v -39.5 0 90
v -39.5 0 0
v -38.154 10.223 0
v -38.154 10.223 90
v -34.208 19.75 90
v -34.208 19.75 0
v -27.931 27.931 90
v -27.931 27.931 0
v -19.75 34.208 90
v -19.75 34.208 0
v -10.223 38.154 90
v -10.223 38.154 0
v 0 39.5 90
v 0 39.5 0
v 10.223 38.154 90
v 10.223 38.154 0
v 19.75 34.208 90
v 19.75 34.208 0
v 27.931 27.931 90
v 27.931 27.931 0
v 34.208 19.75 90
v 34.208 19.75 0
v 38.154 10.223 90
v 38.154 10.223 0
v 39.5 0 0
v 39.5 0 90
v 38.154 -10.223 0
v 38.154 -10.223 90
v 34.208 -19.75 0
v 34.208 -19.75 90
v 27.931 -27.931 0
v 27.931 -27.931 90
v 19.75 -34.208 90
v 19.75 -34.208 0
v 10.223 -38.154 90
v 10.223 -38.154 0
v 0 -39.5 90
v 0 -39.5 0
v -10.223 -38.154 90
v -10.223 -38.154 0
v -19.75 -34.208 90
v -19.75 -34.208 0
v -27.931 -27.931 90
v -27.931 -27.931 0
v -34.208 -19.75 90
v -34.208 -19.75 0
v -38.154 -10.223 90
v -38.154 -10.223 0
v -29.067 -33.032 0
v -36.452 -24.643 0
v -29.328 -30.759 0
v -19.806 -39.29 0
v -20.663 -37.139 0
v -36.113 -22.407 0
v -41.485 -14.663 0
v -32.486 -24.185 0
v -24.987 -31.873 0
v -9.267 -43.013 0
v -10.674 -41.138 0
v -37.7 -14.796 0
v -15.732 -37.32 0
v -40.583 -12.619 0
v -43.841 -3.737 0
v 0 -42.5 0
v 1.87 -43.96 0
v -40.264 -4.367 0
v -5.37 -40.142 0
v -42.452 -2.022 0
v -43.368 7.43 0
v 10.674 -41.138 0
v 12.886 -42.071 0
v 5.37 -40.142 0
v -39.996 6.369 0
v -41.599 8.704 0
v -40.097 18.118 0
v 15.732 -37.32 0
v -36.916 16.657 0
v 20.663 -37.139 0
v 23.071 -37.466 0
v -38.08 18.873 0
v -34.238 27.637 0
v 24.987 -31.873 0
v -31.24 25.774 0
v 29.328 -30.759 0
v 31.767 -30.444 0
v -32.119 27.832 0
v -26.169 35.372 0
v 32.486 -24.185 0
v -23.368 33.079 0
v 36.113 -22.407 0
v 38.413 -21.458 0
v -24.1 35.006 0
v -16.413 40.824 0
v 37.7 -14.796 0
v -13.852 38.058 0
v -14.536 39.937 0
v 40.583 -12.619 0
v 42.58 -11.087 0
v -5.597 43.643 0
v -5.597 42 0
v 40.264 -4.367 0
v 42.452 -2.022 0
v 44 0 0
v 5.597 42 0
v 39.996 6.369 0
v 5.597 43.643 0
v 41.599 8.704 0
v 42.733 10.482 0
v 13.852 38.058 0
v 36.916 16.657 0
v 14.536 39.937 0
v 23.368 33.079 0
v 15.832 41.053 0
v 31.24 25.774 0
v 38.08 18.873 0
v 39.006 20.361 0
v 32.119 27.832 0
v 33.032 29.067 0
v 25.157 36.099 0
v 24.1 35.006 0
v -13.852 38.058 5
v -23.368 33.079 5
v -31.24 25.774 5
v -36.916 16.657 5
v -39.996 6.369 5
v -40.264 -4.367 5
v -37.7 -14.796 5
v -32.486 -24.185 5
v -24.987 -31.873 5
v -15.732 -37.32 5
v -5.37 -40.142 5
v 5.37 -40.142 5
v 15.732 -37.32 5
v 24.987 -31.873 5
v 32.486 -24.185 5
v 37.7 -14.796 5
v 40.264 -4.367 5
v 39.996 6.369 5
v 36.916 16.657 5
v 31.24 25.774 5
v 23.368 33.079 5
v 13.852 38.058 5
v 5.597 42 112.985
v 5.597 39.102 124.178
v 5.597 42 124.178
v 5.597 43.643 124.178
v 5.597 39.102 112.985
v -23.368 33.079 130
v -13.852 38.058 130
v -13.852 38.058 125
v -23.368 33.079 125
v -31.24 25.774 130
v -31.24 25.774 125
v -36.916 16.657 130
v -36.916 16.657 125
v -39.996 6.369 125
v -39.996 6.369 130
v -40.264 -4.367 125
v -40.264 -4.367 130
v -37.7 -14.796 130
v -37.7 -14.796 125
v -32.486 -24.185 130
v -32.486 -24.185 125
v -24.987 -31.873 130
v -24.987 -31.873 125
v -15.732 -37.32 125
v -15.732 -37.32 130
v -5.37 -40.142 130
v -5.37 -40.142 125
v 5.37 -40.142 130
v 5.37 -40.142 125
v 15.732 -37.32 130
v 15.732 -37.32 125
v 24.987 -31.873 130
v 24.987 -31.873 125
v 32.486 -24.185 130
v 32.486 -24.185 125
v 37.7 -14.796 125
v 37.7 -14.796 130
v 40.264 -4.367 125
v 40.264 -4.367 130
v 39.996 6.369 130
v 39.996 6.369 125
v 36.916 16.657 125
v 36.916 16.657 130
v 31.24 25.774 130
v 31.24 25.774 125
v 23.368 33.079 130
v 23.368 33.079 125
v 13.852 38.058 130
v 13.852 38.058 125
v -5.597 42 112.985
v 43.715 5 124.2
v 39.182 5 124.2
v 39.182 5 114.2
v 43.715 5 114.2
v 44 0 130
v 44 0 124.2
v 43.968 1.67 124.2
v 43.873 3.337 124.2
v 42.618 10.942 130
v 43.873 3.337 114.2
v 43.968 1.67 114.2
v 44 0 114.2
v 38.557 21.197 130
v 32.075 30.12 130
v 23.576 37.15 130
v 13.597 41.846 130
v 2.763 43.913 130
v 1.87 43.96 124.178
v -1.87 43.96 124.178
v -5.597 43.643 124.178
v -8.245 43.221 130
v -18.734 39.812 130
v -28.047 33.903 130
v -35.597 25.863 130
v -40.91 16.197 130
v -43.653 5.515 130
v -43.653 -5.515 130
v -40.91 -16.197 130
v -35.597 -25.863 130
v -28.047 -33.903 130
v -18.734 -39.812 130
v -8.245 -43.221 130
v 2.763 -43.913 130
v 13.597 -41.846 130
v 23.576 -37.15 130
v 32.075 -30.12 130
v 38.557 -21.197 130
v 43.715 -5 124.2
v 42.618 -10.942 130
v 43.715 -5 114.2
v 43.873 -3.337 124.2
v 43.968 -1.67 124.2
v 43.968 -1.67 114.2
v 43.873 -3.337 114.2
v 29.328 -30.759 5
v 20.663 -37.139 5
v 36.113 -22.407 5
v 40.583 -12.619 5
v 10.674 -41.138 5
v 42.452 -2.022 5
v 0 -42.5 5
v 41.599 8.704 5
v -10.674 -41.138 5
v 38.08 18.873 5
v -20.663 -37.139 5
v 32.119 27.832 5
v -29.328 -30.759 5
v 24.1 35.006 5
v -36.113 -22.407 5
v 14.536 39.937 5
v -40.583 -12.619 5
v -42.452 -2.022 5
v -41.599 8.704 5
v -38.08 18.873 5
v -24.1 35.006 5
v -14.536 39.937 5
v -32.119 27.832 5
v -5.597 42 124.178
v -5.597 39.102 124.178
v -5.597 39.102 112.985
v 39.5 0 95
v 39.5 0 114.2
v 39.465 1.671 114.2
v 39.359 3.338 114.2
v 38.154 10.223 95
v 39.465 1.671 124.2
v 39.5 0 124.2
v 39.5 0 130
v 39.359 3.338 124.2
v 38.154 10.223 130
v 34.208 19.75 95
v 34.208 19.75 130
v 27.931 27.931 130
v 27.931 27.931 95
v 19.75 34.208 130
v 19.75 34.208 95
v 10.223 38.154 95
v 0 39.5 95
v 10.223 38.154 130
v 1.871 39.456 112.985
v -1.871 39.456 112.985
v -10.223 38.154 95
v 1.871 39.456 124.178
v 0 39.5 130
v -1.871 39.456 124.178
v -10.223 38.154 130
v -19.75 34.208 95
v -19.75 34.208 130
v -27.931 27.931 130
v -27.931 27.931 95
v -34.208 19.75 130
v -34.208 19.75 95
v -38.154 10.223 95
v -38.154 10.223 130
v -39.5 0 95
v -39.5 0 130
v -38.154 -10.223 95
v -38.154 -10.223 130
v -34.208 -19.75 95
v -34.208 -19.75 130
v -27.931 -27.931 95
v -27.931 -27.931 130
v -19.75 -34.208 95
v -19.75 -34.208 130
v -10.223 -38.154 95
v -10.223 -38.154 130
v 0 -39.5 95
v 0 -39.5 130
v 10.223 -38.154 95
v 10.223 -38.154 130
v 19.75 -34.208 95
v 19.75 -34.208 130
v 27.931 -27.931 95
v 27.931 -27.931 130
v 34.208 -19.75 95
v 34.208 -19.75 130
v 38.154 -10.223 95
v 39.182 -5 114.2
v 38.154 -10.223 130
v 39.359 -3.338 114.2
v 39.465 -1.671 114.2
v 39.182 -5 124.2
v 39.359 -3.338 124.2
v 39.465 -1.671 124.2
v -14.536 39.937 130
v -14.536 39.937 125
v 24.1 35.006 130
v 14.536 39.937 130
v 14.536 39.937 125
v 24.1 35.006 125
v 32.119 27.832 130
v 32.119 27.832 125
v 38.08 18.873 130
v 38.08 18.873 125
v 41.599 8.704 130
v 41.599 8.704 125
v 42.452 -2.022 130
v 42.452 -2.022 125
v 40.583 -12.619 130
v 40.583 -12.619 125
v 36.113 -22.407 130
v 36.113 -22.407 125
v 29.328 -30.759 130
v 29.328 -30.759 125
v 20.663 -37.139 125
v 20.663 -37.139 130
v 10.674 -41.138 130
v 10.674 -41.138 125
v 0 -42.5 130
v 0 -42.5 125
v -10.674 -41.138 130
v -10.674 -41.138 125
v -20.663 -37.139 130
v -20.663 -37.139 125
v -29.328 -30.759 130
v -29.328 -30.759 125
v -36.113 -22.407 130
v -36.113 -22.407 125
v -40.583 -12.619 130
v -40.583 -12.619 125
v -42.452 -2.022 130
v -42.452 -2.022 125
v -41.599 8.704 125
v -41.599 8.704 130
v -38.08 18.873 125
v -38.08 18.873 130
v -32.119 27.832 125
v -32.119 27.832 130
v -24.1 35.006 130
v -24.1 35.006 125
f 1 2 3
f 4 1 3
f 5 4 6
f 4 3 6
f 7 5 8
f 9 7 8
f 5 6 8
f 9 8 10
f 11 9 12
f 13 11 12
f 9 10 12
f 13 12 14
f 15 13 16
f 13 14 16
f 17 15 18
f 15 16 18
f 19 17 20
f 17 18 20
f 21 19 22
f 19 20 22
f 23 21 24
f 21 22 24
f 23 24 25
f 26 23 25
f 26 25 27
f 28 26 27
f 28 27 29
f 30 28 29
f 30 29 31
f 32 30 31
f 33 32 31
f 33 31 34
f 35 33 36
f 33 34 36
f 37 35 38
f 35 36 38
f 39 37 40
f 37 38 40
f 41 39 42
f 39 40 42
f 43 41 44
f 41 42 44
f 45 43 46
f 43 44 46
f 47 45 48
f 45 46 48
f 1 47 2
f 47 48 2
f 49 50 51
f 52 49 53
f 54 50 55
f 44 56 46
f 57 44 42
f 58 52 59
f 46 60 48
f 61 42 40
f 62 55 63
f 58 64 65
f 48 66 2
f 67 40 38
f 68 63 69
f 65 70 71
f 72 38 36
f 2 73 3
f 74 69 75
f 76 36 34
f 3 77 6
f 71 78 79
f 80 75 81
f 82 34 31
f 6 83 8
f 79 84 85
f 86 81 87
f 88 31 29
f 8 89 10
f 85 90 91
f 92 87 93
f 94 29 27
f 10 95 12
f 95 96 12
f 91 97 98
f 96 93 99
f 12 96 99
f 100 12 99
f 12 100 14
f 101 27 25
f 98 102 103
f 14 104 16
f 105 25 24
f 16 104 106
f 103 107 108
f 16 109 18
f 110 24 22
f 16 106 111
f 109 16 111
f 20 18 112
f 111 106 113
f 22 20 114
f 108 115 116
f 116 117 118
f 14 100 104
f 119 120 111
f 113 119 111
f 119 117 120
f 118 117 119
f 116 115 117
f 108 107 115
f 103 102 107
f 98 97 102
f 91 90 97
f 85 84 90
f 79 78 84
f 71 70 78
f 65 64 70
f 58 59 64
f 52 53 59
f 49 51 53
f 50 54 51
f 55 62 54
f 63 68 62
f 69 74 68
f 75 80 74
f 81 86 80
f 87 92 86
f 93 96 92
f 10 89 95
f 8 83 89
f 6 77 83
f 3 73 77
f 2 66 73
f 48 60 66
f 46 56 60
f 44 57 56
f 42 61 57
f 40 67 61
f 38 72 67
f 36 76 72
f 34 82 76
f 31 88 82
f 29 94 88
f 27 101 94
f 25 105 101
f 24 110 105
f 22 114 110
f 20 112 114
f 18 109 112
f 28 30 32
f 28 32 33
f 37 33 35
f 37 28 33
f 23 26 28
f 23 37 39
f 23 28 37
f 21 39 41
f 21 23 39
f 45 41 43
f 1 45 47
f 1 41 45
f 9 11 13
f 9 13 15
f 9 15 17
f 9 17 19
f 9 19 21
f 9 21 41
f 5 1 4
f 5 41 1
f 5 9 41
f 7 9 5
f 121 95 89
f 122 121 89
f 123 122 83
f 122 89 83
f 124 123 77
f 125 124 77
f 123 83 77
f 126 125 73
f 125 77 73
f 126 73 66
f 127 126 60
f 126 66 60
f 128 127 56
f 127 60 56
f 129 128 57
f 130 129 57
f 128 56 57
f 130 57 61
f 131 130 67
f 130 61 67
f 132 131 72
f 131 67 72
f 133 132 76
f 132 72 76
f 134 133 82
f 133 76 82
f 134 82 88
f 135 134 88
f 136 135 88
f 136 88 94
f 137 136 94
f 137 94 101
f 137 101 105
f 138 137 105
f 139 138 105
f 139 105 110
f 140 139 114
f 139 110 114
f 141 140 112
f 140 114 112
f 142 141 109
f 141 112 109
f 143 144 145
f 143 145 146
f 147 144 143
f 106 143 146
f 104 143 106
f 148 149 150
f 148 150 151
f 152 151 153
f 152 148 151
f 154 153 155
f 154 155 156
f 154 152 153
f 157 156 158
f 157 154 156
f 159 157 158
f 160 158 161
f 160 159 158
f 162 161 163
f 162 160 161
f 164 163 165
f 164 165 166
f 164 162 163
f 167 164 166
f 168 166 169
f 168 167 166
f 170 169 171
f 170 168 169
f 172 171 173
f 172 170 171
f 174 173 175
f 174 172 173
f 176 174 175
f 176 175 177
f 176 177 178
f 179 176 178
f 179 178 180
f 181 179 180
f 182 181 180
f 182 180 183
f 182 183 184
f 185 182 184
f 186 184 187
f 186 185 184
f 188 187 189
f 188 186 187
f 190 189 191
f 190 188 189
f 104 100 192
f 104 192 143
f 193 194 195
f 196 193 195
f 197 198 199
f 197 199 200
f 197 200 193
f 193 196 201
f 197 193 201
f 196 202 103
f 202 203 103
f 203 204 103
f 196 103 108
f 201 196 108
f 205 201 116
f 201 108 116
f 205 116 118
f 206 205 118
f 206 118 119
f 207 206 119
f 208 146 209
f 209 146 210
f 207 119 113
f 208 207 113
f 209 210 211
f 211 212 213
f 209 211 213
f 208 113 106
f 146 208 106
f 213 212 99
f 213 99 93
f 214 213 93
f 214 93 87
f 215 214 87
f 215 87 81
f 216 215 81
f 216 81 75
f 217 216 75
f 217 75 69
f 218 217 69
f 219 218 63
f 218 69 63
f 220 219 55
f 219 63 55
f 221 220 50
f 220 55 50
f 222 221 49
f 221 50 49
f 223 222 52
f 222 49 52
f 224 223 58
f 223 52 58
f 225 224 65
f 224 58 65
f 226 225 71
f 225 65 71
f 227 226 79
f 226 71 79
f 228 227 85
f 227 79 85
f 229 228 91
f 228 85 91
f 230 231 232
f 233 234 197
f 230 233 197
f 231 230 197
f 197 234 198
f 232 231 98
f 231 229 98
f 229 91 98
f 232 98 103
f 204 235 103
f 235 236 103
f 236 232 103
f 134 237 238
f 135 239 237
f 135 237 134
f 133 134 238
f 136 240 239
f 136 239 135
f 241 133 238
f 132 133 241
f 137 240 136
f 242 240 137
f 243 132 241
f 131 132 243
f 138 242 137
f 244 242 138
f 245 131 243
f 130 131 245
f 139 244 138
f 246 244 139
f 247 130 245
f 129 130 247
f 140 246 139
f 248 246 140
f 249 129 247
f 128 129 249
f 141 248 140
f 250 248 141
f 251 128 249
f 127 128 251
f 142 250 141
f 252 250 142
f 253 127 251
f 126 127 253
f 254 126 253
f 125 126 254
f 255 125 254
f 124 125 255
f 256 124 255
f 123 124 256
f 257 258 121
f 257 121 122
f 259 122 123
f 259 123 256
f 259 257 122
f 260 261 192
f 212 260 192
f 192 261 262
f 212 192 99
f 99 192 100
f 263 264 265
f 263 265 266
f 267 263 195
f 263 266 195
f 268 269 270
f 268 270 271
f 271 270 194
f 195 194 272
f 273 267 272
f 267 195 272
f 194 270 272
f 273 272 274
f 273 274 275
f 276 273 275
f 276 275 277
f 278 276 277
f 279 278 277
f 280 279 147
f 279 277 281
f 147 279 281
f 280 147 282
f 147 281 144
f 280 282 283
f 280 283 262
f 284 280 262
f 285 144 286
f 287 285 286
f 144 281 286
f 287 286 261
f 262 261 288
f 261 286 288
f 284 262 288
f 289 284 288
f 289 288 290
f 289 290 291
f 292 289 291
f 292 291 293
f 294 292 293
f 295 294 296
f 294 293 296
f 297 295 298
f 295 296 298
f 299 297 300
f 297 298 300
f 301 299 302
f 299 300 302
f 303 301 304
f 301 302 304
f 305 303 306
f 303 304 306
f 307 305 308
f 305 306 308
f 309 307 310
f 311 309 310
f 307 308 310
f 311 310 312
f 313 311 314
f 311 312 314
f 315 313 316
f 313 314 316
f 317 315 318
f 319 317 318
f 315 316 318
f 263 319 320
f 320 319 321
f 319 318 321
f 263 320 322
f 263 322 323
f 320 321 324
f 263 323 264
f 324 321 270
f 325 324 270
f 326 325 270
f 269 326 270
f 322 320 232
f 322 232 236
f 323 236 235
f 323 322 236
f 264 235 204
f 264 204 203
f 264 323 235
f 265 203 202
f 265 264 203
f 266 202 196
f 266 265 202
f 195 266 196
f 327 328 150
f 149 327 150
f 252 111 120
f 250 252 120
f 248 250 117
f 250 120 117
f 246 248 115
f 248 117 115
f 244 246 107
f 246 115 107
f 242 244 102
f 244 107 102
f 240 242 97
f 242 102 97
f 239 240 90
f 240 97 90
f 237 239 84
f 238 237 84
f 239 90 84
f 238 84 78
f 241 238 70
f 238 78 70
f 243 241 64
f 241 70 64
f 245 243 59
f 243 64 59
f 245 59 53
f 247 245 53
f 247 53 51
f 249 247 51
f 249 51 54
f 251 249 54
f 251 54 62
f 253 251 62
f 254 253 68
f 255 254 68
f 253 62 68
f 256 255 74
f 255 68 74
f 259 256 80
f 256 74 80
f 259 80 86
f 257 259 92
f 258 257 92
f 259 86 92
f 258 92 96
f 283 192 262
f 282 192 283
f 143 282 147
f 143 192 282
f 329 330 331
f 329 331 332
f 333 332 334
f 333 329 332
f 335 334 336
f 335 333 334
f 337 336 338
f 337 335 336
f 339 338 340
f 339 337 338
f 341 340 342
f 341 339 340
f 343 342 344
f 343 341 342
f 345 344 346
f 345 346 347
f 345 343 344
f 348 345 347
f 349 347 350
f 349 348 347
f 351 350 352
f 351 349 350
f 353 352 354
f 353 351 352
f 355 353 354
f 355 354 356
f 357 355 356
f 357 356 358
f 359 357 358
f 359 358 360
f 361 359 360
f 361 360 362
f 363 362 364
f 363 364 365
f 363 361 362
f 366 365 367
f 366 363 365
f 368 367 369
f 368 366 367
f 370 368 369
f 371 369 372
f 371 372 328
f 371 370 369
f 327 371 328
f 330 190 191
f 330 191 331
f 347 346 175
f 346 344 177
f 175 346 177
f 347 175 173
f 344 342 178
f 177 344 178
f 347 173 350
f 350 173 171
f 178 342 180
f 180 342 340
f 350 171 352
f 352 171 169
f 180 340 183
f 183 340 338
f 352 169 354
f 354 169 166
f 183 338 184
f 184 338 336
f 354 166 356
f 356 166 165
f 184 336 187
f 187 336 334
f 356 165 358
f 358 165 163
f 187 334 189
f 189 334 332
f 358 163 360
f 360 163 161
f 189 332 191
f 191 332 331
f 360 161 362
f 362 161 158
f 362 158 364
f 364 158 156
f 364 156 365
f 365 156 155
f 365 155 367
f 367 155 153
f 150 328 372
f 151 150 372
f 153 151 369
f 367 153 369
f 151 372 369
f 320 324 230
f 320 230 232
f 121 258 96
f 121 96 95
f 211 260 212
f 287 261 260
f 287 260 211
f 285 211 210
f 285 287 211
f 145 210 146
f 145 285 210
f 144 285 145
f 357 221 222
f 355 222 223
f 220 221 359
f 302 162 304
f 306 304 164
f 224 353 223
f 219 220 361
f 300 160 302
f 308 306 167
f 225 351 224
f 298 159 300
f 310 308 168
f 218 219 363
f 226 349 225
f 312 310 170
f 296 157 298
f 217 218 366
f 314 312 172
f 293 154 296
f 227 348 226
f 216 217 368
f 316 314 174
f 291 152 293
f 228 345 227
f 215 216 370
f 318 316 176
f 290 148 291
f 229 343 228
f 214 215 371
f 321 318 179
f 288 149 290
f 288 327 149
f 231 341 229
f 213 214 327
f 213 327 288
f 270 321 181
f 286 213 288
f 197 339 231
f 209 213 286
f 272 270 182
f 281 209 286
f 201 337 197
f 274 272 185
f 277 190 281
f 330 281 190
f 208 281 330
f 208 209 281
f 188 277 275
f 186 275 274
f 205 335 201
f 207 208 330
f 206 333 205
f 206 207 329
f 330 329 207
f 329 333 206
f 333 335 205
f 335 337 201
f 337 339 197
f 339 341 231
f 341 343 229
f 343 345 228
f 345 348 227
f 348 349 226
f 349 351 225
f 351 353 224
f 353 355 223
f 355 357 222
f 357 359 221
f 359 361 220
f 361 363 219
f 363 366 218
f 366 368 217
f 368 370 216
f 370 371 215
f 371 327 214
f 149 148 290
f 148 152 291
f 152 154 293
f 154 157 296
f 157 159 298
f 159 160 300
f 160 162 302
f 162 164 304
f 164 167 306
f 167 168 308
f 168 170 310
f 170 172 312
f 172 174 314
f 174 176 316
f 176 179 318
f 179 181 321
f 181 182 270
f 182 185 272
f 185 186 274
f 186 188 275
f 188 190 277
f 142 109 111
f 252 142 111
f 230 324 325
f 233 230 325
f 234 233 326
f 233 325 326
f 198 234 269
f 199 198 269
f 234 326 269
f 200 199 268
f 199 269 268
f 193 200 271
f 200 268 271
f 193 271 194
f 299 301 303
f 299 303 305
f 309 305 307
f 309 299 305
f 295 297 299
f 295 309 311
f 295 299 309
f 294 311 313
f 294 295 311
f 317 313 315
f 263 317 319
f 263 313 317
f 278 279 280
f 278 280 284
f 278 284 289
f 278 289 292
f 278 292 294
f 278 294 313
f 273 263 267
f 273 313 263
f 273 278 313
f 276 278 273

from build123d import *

# Parameters (mm, degrees)
SKETCH1_R               = 44
BOSS_EXTRUDE1_DEPTH     = 130
SKETCH2_R               = 39.5
CUT_EXTRUDE1_DEPTH      = 90
SKETCH3_R               = 39.5
CUT_EXTRUDE2_DEPTH      = 35
SKETCH6_W               = 11.193141888
SKETCH6_H               = 132.356748066
CUT_EXTRUDE3_DEPTH      = 95
SKETCH7_W               = 11.193141888
SKETCH7_H               = 11.193141887
CUT_EXTRUDE4_DEPTH      = 25
CUT_EXTRUDE5_DEPTH      = 5
SKETCH11_W              = 10
SKETCH11_H              = 10
CUT_EXTRUDE6_DEPTH      = 5
CUT_EXTRUDE6_DEPTH_BACK = 5


with BuildPart() as part:
    # Sketch1 → Boss-Extrude1 (new body)
    with BuildSketch(Plane.XY):
        Circle(SKETCH1_R)
    extrude(amount=BOSS_EXTRUDE1_DEPTH)

    # Sketch2 → Cut-Extrude1 (cut)
    with BuildSketch(Plane(origin=(0, 0, 0), x_dir=(-1, 0, 0), z_dir=(0, 0, -1))):
        Circle(SKETCH2_R)
    extrude(amount=-CUT_EXTRUDE1_DEPTH, mode=Mode.SUBTRACT)

    # Sketch3 → Cut-Extrude2 (cut)
    with BuildSketch(Plane.XY.offset(130)):
        Circle(SKETCH3_R)
    extrude(amount=-CUT_EXTRUDE2_DEPTH, mode=Mode.SUBTRACT)

    # Sketch6 → Cut-Extrude3 (cut)
    with BuildSketch(Plane(origin=(0, 42, 0), x_dir=(1, 0, 0), z_dir=(0, 1, 0))):
        with Locations((0, -58)):
            Rectangle(SKETCH6_W, SKETCH6_H)
    extrude(amount=CUT_EXTRUDE3_DEPTH, mode=Mode.SUBTRACT)

    # Sketch7 → Cut-Extrude4 (cut)
    with BuildSketch(Plane(origin=(0, 42, 0), x_dir=(1, 0, 0), z_dir=(0, 1, 0))):
        with Locations((0, -118.581803089)):
            Rectangle(SKETCH7_W, SKETCH7_H)
    extrude(amount=-CUT_EXTRUDE4_DEPTH, mode=Mode.SUBTRACT)

    # Sketch9 → Cut-Extrude5 (cut)
    with BuildSketch(Plane(origin=(0, 0, 0), x_dir=(-1, 0, 0), z_dir=(0, 0, -1))):
        with BuildLine():
            Line((14.535856091, 39.936936383), (13.851815805, 38.057551142))
            ThreePointArc((13.851815805, 38.057551142), (0, -40.5), (-13.851815805, 38.057551142))
            Line((-13.851815805, 38.057551142), (-14.535856091, 39.936936383))
            ThreePointArc((-14.535856091, 39.936936383), (0, -42.5), (14.535856091, 39.936936383))
        make_face()
    cut_extrude5 = extrude(amount=-CUT_EXTRUDE5_DEPTH, mode=Mode.SUBTRACT)

    # Sketch11 → Cut-Extrude6 (cut, two sides)
    with BuildSketch(Plane(origin=(40, 0, 0), x_dir=(0, 0, -1), z_dir=(1, 0, 0))) as cut_extrude6_sk:
        with Locations((-119.2, 0)):
            Rectangle(SKETCH11_W, SKETCH11_H)
    extrude(amount=CUT_EXTRUDE6_DEPTH, mode=Mode.SUBTRACT)
    extrude(cut_extrude6_sk.sketch, amount=-CUT_EXTRUDE6_DEPTH_BACK, mode=Mode.SUBTRACT)

    # Mirror1: Cut-Extrude5 across plane
    add(cut_extrude5.mirror(Plane(origin=(0, 0, 65), x_dir=(1, 0, 0), z_dir=(0, 0, -1))), mode=Mode.SUBTRACT)


solid = part.part
